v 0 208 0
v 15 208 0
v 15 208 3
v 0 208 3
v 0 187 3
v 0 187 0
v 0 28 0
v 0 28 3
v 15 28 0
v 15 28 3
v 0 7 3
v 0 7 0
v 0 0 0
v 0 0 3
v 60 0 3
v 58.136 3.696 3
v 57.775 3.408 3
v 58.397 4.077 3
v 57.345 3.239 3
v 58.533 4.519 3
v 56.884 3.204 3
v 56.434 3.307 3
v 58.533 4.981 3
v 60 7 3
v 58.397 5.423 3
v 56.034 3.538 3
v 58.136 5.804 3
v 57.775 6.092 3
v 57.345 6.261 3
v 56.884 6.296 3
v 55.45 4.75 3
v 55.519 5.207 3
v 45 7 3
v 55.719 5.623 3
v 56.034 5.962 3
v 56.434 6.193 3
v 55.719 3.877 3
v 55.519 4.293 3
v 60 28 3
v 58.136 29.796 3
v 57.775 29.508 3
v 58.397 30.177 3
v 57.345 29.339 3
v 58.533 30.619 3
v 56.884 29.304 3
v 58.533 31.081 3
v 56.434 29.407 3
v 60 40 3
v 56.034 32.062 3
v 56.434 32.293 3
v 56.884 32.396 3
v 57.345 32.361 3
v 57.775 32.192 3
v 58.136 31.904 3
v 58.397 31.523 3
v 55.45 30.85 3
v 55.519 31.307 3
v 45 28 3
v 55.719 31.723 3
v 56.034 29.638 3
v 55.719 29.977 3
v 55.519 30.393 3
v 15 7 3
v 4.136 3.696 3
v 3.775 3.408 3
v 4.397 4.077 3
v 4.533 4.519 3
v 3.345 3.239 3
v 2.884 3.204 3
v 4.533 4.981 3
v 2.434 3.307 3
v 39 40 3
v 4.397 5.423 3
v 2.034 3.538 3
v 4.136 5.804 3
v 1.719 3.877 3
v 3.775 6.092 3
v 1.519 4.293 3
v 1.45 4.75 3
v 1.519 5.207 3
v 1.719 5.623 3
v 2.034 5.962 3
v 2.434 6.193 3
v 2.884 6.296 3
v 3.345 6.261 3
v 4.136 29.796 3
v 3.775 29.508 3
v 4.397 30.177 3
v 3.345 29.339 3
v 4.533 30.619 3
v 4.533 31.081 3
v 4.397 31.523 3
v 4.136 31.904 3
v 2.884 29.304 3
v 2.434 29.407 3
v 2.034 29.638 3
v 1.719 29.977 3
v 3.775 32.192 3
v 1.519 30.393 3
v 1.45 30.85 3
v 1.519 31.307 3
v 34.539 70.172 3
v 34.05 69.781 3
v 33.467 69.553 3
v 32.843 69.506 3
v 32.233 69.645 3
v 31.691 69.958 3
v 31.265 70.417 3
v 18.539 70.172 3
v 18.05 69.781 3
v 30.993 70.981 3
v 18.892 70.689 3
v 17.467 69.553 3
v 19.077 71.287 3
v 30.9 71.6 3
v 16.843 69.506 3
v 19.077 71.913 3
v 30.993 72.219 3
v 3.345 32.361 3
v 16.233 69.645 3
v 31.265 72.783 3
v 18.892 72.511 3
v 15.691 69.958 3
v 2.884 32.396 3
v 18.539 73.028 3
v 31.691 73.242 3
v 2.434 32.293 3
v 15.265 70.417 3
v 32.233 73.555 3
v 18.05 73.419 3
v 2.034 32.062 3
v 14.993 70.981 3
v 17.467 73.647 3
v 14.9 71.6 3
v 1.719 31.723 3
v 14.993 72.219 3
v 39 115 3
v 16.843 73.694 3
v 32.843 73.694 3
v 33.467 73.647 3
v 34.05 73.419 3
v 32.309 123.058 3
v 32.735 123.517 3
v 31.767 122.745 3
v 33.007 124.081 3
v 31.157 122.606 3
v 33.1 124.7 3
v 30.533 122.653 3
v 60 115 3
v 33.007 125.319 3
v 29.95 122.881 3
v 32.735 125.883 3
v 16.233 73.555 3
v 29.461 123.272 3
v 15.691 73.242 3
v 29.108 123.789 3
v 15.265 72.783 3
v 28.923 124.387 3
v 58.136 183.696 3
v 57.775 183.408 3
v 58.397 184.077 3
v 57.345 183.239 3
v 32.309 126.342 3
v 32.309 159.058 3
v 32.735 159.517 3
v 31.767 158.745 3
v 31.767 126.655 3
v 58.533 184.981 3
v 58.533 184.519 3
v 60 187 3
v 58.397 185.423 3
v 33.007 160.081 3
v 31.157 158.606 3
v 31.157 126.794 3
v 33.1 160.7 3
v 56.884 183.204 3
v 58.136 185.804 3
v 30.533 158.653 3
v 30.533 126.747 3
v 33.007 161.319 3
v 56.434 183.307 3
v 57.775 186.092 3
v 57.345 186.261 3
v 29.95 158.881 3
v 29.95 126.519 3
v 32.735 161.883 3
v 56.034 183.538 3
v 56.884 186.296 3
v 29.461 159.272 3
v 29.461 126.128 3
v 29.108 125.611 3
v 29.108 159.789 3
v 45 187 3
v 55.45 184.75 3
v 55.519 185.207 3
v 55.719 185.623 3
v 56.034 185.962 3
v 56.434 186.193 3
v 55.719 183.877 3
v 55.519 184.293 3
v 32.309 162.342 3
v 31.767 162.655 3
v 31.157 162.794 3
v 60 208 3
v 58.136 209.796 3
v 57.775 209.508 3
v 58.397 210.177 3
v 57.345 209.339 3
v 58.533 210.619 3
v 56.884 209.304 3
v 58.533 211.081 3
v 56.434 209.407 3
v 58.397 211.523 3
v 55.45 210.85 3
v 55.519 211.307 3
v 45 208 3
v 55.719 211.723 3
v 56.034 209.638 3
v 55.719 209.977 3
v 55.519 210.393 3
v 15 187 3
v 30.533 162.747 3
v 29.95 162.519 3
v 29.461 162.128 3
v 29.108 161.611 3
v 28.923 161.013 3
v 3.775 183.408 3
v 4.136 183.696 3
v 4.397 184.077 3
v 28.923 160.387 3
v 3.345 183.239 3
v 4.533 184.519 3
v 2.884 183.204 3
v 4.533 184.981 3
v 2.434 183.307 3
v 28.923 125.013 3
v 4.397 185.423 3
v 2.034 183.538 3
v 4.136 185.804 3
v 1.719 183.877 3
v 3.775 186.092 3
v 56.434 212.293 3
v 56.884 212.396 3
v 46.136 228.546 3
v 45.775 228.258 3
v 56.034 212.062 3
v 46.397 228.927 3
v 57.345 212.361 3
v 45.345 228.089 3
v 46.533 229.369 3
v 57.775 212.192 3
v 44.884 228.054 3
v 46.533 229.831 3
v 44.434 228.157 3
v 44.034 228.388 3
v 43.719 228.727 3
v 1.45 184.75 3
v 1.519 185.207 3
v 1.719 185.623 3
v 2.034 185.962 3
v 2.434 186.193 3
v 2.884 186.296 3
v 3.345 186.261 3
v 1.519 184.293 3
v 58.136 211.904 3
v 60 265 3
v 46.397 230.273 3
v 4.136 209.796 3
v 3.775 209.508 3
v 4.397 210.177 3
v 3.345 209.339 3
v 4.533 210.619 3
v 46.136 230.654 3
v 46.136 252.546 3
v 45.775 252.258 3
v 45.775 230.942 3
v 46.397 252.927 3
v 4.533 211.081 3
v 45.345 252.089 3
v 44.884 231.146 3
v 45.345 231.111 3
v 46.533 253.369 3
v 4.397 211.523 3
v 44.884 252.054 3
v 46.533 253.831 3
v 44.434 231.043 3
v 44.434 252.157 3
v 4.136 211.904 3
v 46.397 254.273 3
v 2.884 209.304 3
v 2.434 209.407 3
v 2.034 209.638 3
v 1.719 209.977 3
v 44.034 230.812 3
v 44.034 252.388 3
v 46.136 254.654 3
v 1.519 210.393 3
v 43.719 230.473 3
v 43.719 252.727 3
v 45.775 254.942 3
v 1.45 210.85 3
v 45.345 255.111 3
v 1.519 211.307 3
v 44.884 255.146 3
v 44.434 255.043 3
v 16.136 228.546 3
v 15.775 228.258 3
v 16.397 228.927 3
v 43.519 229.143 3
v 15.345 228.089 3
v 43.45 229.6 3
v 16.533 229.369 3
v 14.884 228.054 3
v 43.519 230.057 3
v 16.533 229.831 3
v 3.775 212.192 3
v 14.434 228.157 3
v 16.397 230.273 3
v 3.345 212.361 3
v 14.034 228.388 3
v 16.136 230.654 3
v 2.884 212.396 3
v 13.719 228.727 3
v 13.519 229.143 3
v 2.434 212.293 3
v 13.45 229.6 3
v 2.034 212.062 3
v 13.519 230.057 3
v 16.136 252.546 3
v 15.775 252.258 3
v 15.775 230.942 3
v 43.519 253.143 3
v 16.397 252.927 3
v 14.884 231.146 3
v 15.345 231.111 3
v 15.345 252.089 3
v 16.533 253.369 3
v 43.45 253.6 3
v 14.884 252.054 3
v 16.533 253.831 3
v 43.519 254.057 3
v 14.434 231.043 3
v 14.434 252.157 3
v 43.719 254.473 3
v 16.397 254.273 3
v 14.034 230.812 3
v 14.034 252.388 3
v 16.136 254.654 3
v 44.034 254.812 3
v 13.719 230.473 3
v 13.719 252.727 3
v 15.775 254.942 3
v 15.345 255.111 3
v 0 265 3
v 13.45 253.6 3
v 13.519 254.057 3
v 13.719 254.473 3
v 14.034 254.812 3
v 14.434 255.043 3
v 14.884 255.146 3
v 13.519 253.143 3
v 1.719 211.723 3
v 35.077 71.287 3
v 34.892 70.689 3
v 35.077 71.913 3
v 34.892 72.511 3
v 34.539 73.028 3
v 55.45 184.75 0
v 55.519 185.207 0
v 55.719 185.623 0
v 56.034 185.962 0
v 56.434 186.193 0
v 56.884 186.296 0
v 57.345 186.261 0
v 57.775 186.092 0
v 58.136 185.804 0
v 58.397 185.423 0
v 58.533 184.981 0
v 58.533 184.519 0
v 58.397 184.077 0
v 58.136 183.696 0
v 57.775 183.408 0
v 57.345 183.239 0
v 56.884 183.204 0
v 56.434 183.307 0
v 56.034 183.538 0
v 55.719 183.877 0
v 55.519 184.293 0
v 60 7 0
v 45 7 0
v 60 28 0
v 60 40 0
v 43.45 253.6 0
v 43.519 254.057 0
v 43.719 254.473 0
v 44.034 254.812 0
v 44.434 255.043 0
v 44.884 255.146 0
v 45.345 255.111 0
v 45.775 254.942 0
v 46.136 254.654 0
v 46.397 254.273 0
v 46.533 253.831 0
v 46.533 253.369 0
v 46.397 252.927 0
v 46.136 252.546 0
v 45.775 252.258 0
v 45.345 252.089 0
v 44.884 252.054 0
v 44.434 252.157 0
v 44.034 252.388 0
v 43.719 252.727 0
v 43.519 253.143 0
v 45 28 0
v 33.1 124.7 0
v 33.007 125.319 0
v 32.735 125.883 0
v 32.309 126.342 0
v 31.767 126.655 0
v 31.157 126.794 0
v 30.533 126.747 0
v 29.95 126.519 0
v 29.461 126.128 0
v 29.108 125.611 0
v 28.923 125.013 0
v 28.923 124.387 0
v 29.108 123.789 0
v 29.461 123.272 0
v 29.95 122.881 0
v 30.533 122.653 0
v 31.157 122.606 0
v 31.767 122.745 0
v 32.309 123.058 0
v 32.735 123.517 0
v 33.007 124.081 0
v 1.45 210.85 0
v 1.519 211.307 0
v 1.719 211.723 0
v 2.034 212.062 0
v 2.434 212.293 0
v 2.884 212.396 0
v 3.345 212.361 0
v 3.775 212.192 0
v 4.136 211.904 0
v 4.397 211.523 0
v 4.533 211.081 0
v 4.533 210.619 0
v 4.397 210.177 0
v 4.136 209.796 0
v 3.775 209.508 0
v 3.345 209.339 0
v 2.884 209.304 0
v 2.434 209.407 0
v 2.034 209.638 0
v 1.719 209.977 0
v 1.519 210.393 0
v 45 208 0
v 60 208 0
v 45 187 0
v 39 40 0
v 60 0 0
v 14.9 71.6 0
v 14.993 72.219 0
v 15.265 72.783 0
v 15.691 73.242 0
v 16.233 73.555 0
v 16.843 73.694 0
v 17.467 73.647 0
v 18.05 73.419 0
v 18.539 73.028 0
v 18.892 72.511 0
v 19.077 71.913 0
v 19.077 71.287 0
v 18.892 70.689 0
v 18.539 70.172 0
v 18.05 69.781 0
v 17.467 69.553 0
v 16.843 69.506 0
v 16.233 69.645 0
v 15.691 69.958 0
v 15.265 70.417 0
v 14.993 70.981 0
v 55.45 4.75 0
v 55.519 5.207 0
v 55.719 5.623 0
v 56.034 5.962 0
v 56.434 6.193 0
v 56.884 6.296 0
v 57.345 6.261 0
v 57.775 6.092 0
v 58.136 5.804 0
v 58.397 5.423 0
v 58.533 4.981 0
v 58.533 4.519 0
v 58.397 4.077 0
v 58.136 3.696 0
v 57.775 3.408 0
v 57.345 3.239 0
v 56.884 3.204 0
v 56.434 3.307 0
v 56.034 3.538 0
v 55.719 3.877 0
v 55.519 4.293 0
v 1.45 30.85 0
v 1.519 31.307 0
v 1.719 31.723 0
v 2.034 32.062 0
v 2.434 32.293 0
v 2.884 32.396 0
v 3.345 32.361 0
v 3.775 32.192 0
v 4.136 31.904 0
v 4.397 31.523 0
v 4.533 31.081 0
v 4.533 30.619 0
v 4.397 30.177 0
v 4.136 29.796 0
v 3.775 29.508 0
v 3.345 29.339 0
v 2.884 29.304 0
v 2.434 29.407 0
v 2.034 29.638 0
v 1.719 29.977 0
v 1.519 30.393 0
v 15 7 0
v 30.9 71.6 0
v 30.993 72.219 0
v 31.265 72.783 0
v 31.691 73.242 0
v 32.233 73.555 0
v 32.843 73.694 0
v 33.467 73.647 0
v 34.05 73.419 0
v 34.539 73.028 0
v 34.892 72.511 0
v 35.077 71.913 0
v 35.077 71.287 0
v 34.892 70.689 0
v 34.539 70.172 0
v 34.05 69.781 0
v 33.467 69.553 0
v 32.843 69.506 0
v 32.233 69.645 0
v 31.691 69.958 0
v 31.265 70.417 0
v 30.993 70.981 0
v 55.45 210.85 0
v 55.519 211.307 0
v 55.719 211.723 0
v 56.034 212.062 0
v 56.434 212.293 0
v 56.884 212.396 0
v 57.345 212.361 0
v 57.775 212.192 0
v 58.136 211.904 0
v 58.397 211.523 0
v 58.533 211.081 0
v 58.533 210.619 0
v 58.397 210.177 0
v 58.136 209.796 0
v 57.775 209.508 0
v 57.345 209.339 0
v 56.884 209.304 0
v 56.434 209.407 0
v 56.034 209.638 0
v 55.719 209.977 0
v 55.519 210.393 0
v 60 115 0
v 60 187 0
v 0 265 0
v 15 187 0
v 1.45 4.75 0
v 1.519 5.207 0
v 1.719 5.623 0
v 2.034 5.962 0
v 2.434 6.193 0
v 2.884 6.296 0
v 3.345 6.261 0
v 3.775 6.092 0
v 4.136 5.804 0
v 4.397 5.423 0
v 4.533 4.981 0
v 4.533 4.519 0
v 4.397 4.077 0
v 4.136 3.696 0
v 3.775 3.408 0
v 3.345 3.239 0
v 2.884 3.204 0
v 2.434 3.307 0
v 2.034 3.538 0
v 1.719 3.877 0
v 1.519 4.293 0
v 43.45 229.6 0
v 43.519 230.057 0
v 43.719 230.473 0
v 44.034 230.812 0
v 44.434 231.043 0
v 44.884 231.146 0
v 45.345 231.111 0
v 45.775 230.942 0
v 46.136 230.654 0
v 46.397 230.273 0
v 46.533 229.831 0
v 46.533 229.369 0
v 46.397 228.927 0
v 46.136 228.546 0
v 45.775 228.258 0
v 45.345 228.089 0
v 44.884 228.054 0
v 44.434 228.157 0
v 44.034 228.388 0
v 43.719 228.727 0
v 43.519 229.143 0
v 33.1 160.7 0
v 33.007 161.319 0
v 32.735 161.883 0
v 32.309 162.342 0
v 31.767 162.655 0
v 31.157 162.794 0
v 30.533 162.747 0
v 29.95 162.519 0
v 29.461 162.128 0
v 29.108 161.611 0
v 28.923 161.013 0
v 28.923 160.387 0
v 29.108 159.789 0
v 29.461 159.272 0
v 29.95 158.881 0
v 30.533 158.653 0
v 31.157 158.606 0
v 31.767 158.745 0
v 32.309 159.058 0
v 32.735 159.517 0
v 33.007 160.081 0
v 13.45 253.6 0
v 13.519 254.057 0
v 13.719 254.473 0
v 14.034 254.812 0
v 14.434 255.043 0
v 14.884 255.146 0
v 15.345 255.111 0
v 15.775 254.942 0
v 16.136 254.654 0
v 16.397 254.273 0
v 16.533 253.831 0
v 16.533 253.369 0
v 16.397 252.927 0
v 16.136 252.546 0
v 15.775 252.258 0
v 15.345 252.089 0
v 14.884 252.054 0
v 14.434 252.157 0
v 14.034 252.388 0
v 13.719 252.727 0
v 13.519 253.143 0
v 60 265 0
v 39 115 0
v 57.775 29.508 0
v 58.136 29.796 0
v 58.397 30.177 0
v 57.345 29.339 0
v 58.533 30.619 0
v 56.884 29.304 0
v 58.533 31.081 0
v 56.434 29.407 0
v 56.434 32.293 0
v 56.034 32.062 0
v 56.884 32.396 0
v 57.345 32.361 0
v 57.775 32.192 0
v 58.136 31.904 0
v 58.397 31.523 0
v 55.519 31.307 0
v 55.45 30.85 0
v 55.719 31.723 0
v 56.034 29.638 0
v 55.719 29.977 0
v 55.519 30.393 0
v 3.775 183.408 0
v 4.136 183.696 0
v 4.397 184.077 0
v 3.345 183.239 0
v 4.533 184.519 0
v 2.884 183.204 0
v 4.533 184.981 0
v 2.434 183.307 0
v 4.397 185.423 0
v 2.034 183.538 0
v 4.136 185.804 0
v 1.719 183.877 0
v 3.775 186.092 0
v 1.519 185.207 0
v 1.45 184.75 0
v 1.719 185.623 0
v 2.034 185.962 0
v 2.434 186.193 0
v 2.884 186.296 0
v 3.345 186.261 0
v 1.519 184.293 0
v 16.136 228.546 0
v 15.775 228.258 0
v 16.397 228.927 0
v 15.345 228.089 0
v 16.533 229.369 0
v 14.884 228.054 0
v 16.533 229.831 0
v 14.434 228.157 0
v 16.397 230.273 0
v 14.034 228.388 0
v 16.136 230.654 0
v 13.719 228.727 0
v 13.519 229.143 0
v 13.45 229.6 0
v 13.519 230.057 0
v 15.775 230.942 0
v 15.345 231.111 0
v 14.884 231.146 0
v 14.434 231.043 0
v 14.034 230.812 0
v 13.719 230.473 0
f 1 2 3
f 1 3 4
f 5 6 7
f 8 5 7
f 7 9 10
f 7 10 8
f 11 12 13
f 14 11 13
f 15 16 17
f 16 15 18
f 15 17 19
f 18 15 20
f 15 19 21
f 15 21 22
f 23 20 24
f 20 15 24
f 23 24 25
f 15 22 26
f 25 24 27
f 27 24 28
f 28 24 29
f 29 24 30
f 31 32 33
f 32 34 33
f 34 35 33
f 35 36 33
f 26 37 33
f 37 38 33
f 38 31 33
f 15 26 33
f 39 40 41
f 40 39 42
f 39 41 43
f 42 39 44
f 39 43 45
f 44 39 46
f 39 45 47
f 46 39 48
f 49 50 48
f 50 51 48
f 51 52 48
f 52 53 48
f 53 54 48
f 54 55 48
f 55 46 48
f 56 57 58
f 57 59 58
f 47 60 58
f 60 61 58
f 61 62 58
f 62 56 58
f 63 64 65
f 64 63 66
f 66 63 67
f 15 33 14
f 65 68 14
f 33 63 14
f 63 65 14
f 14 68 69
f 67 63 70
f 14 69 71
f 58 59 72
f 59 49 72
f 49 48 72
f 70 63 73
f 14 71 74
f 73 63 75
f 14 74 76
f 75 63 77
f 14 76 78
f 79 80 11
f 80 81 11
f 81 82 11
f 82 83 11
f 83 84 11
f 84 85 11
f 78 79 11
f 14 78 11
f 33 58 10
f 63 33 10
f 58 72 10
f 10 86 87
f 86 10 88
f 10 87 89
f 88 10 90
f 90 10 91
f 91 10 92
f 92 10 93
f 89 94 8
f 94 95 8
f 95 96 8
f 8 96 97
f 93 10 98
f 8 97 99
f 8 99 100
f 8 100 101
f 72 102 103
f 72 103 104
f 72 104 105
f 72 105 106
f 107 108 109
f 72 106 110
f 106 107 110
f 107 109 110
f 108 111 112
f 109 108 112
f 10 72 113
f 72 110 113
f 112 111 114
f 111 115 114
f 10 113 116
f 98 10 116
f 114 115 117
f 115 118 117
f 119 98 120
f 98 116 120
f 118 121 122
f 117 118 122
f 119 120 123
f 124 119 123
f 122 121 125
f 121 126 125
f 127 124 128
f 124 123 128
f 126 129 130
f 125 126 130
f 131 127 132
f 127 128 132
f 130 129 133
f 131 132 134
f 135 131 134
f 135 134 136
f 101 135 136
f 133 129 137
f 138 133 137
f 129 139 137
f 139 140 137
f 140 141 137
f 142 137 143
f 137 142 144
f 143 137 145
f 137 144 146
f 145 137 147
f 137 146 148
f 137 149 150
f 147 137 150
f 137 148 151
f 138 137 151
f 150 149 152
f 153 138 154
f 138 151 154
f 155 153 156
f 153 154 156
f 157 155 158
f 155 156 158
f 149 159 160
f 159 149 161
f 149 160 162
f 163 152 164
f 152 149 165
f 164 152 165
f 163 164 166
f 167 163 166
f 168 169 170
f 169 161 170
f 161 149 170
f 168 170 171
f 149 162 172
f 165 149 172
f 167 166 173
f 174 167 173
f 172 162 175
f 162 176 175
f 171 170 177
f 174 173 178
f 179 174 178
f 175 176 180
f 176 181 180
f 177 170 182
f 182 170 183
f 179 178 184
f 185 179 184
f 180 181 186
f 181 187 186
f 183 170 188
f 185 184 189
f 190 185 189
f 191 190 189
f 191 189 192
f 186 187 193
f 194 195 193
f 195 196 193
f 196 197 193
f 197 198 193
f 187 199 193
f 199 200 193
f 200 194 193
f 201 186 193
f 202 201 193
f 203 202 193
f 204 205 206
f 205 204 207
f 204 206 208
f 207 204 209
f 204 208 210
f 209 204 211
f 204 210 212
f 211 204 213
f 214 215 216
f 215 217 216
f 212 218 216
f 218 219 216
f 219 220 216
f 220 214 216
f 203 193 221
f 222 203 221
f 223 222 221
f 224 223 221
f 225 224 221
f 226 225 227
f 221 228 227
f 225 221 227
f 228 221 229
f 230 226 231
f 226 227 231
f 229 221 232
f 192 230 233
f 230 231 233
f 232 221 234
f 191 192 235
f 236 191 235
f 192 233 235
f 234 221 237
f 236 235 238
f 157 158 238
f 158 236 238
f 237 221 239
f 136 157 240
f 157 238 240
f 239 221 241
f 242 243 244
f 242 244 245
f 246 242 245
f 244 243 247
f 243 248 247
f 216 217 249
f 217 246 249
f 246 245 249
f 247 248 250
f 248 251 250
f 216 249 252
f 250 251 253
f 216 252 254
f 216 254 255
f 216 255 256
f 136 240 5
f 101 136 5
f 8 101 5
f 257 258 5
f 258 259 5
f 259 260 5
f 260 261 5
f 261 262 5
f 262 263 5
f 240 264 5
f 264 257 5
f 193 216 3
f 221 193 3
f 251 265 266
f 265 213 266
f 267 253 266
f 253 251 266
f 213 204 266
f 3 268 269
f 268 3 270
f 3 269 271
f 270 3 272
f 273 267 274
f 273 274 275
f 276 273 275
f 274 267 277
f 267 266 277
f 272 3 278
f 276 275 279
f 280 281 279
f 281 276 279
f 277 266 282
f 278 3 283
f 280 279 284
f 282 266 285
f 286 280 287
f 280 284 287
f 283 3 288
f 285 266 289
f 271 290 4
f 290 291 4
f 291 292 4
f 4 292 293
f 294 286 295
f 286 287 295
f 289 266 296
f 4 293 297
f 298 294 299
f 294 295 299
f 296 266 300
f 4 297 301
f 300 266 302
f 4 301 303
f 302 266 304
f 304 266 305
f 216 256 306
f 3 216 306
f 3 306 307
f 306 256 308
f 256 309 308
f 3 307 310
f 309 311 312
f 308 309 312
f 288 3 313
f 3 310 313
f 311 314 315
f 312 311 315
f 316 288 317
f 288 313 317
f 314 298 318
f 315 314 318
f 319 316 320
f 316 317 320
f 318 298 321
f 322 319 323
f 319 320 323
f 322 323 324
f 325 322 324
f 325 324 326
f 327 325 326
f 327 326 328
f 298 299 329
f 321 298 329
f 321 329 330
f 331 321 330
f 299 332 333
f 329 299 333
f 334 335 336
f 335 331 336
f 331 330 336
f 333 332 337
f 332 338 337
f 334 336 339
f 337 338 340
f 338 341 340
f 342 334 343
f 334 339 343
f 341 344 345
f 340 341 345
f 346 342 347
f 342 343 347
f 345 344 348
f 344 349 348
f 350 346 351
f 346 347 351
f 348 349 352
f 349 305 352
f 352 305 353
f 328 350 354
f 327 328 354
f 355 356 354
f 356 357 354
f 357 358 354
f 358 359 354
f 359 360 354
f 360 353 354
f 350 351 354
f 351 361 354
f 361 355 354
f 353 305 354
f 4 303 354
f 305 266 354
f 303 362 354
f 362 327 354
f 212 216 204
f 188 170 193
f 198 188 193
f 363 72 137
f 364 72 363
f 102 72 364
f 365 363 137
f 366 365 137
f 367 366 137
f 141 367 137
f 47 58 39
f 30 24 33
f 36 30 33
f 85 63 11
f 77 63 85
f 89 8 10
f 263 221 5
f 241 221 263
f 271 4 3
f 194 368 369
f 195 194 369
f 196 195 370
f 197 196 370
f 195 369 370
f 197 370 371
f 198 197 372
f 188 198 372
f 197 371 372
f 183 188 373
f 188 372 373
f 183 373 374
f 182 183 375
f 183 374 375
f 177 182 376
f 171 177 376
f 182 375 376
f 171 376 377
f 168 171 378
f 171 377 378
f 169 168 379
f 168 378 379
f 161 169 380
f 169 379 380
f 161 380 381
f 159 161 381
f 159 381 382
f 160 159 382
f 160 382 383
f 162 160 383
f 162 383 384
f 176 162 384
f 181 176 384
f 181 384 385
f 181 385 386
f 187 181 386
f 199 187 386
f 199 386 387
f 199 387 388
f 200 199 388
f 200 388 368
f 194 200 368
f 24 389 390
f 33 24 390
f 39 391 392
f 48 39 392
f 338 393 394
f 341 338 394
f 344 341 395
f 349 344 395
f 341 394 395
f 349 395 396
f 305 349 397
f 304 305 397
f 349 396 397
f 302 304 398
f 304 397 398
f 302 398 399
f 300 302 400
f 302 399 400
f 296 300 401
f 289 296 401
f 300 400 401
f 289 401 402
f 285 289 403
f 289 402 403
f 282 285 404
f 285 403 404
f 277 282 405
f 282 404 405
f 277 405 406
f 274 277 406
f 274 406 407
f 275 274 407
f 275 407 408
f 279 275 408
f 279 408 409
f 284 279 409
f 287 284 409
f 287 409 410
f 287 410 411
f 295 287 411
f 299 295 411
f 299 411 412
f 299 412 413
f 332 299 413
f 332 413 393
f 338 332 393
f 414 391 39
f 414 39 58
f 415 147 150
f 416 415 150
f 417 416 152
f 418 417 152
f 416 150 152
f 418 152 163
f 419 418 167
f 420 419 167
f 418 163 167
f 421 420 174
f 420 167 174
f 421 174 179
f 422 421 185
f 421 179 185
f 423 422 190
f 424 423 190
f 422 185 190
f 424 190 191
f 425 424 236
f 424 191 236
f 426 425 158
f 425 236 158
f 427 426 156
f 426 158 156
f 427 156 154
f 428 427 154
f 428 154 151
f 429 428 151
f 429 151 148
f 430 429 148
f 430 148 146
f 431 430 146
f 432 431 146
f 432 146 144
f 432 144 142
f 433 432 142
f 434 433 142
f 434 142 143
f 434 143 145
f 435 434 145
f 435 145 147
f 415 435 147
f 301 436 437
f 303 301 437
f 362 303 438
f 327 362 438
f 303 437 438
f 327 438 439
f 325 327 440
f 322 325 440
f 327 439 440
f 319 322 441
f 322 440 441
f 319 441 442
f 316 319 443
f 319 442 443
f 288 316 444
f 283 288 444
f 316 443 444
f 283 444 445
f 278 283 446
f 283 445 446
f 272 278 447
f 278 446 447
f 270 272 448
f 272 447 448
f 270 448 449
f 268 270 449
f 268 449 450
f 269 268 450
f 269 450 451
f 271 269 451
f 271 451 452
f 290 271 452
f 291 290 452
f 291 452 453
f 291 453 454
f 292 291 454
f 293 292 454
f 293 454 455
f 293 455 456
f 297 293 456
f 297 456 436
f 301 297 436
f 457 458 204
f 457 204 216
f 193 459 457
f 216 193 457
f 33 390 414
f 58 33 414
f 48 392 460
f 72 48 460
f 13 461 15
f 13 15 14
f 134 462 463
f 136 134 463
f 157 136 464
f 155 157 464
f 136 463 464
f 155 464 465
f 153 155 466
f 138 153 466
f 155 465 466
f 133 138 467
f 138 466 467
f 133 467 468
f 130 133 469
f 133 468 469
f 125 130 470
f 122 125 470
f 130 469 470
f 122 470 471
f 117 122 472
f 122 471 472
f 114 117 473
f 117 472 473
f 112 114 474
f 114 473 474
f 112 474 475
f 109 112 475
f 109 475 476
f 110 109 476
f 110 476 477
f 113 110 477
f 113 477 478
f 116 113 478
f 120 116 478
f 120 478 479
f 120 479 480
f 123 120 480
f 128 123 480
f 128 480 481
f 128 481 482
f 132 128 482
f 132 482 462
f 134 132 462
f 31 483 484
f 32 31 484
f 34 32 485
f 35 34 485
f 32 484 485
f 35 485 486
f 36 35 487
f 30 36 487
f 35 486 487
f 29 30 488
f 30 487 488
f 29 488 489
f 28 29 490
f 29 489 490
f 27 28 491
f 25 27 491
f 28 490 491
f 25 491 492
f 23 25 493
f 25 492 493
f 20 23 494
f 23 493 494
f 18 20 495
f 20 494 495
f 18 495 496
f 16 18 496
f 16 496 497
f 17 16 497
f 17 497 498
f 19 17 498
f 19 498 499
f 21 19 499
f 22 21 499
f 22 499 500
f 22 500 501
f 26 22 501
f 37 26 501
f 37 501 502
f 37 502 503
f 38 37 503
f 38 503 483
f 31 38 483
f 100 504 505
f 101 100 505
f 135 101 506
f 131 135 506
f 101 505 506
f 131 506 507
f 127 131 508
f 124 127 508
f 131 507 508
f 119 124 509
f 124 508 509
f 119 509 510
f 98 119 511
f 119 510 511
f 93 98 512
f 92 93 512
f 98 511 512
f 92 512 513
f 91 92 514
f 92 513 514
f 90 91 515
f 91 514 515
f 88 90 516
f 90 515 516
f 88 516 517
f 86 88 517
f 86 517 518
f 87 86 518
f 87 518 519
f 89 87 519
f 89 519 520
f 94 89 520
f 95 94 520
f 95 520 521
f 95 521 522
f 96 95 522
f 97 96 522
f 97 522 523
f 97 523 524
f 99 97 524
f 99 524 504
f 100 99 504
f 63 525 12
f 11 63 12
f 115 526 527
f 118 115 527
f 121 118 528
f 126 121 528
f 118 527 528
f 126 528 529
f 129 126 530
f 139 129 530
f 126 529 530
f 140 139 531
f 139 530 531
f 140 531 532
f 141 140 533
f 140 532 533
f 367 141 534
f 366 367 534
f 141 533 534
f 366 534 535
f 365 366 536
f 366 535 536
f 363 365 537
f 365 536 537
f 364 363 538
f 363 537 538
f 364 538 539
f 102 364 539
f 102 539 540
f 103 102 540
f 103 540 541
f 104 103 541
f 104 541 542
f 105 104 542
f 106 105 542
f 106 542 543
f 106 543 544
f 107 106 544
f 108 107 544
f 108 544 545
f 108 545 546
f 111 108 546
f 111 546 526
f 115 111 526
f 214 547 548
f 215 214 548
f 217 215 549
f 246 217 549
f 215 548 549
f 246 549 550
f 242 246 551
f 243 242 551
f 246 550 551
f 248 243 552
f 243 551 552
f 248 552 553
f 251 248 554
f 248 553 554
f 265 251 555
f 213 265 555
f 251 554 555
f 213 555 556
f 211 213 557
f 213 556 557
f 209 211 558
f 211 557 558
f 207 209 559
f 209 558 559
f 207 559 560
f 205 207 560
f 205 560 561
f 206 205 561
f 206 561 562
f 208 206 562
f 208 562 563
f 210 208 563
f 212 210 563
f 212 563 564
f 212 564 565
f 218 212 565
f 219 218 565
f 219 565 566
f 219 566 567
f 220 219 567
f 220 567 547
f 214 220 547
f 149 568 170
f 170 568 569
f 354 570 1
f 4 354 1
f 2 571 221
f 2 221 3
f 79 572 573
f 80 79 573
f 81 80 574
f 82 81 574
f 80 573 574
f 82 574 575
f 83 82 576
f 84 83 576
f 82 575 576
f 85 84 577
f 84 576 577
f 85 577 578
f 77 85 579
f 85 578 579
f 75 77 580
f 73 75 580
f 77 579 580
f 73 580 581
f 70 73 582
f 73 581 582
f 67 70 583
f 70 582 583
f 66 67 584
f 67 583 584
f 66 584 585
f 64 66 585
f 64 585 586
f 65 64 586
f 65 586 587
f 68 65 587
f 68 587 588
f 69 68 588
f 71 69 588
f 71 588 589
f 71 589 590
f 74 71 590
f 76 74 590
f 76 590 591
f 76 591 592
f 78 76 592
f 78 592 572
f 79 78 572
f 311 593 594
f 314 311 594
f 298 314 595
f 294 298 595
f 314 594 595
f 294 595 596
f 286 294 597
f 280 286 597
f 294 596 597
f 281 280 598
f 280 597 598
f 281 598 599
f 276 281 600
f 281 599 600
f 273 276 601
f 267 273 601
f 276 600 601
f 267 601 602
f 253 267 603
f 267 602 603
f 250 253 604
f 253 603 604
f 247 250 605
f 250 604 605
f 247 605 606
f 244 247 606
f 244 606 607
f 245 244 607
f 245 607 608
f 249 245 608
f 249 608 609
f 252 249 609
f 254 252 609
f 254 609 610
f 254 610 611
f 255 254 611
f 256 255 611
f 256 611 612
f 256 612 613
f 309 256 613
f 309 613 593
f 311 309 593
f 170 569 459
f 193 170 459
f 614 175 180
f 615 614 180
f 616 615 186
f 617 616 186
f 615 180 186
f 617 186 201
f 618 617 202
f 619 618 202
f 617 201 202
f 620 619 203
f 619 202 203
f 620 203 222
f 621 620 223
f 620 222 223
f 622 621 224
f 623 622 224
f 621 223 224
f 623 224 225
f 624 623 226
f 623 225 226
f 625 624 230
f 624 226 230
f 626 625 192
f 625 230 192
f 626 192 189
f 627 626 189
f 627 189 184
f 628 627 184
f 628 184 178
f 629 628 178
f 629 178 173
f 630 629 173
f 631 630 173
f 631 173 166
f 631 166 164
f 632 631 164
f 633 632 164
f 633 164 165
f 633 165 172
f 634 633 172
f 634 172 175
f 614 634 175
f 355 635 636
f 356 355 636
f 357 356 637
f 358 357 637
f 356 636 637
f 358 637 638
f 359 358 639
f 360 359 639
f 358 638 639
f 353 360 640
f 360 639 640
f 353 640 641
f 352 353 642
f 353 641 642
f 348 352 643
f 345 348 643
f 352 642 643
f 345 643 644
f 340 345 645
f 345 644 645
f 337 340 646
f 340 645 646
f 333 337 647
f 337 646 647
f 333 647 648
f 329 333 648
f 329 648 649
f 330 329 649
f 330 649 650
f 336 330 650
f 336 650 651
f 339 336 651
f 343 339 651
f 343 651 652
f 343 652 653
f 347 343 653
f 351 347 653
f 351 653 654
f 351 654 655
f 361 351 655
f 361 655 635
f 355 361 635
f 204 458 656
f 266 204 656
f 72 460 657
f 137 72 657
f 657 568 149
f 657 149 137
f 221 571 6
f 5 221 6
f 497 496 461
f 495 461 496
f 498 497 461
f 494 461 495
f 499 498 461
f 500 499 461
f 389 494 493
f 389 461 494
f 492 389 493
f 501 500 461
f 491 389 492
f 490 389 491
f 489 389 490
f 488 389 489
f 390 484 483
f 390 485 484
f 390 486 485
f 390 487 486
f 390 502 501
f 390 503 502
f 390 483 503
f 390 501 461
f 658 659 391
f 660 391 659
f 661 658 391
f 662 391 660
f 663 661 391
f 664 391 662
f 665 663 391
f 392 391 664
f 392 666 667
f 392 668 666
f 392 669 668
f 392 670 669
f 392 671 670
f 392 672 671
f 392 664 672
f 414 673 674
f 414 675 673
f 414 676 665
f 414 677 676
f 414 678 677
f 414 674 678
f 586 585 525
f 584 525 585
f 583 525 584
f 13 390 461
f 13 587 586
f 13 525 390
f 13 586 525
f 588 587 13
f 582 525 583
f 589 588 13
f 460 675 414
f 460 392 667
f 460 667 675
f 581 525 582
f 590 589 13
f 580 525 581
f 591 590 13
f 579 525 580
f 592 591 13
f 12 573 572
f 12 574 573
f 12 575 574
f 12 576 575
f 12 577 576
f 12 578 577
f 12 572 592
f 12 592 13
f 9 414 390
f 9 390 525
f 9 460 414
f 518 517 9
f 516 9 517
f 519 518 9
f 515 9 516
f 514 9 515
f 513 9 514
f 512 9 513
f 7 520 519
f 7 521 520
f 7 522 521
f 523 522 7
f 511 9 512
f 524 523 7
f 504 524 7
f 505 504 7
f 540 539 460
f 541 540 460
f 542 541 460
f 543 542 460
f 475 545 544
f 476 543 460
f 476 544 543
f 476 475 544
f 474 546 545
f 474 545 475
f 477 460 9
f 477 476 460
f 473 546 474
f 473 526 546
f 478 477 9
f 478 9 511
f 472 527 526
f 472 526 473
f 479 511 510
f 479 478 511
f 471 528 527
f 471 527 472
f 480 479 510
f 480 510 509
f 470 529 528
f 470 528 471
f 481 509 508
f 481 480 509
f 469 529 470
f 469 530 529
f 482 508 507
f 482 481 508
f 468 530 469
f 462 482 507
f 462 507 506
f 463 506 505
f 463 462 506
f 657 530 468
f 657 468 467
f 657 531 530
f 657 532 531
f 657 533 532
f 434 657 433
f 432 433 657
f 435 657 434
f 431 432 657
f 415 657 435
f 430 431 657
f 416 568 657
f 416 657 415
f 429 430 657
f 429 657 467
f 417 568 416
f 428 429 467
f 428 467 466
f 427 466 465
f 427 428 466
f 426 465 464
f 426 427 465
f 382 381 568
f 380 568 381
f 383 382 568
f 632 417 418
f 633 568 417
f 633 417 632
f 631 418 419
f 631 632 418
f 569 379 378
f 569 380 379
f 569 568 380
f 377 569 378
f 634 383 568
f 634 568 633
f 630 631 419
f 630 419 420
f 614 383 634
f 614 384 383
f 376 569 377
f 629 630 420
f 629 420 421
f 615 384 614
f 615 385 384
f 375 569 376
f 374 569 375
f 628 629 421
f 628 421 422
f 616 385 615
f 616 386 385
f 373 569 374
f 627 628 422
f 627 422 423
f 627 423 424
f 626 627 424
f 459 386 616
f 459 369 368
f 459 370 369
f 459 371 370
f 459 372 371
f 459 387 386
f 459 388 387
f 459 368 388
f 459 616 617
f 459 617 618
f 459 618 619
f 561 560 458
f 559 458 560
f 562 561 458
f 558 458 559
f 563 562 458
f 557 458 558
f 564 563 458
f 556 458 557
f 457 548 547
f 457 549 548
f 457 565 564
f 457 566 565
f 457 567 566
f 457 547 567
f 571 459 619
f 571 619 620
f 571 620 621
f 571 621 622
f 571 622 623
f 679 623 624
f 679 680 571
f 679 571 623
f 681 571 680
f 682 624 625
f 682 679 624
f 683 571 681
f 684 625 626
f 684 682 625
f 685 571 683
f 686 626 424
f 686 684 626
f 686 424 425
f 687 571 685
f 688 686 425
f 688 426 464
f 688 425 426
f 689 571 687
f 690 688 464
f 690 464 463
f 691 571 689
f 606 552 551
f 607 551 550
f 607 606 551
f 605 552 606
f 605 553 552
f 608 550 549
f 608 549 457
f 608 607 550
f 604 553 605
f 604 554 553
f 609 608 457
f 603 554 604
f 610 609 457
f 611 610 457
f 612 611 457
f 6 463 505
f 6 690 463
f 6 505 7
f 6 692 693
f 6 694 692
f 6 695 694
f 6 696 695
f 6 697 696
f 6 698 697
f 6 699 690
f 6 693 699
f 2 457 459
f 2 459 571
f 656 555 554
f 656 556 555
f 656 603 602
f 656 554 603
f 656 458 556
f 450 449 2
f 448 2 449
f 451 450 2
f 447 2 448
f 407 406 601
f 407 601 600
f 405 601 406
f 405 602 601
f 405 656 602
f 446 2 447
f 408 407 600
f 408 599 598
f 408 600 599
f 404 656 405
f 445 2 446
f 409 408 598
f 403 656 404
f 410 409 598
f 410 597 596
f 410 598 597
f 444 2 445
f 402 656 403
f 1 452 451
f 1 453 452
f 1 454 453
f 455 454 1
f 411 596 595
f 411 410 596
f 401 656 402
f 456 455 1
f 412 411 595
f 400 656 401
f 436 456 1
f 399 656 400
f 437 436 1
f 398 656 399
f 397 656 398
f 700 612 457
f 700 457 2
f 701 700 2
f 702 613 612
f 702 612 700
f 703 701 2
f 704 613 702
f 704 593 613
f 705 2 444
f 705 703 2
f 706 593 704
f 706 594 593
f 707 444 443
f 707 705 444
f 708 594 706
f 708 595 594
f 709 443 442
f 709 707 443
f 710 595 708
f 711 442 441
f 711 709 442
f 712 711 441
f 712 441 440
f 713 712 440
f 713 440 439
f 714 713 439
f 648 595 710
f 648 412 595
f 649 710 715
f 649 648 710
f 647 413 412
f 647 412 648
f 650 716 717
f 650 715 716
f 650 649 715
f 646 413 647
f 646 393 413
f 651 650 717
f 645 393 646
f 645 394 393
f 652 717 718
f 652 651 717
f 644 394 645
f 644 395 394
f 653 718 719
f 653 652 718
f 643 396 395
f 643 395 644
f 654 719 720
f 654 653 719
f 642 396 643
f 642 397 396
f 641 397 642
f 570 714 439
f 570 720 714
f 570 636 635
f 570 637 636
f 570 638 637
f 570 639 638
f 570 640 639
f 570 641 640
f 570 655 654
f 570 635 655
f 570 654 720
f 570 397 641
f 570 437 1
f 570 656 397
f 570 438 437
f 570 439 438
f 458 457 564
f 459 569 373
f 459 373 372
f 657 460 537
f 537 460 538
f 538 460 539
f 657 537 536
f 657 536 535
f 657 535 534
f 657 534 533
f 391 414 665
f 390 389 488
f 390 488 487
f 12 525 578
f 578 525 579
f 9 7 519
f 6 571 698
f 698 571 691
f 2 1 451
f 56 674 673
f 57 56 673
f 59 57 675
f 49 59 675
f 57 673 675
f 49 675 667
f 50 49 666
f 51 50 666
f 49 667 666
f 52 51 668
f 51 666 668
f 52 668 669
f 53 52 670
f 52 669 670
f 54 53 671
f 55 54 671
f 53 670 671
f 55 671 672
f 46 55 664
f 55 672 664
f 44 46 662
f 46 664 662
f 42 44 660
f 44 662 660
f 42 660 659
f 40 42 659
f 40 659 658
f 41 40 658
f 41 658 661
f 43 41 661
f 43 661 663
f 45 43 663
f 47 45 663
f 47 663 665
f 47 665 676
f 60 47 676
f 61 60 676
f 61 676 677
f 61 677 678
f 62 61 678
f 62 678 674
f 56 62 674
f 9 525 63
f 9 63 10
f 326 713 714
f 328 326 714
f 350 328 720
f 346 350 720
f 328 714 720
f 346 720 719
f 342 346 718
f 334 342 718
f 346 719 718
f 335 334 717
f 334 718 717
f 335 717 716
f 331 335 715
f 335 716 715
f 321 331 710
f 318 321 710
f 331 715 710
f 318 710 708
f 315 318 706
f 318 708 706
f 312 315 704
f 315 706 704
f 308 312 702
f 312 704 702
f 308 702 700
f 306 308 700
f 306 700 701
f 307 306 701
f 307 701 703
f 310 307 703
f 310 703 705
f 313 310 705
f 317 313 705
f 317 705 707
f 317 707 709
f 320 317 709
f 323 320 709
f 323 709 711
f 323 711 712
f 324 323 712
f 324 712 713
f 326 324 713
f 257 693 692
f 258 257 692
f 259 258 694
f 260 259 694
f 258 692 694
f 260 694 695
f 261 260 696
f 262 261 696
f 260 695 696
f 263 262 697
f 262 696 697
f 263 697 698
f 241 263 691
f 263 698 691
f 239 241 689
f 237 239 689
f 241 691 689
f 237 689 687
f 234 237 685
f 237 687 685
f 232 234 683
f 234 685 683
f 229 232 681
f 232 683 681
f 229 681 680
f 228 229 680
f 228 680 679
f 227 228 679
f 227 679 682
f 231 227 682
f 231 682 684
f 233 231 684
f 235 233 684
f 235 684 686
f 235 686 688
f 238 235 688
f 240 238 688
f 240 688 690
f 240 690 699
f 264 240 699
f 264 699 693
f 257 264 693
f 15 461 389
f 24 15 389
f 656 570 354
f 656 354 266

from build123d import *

# Parameters (mm, degrees)
EXTRUDE_1_DEPTH     = 3
SKETCH_4_W          = 15
SKETCH_4_H          = 21
CUT_EXTRUDE_1_DEPTH = 3
SKETCH_5_R          = 1.55
CUT_EXTRUDE_2_DEPTH = 272.724124803
SKETCH_7_W          = 21
SKETCH_7_H          = 75
CUT_EXTRUDE_3_DEPTH = 272.724124803
SKETCH_8_R          = 2.1
CUT_EXTRUDE_4_DEPTH = 272.724124803
SKETCH_9_R          = 2.1
CUT_EXTRUDE_5_DEPTH = 272.724124803


with BuildPart() as part:
    # 草图1 → 凸台-拉伸1 (new body)
    with BuildSketch(Plane.XY):
        Polygon((0, 240), (0, 265), (60, 265), (60, 240), (60, 0), (0, 0), align=None)
    extrude(amount=EXTRUDE_1_DEPTH)

    # 草图4 → 切除-拉伸1 (cut)
    with BuildSketch(Plane(origin=(0, 0, 0), x_dir=(-1, 0, 0), z_dir=(0, 0, -1))):
        with Locations((-52.5, 17.5)):
            Rectangle(SKETCH_4_W, SKETCH_4_H)
        with Locations((-7.5, 17.5)):
            Rectangle(SKETCH_4_W, SKETCH_4_H)
        with Locations((-7.5, 197.5)):
            Rectangle(SKETCH_4_W, SKETCH_4_H)
        with Locations((-52.5, 197.5)):
            Rectangle(SKETCH_4_W, SKETCH_4_H)
    extrude(amount=-CUT_EXTRUDE_1_DEPTH, mode=Mode.SUBTRACT)

    # 草图5 → 切除-拉伸2 (cut, through all)
    with BuildSketch(Plane(origin=(0, 0, 0), x_dir=(-1, 0, 0), z_dir=(0, 0, -1))):
        with Locations((-45, 229.6)):
            Circle(SKETCH_5_R)
        with Locations((-45, 253.6)):
            Circle(SKETCH_5_R)
        with Locations((-15, 253.6)):
            Circle(SKETCH_5_R)
        with Locations((-15, 229.6)):
            Circle(SKETCH_5_R)
        with Locations((-57, 184.75)):
            Circle(SKETCH_5_R)
        with Locations((-3, 184.75)):
            Circle(SKETCH_5_R)
        with Locations((-3, 210.85)):
            Circle(SKETCH_5_R)
        with Locations((-57, 210.85)):
            Circle(SKETCH_5_R)
        with Locations((-57, 4.75)):
            Circle(SKETCH_5_R)
        with Locations((-3, 4.75)):
            Circle(SKETCH_5_R)
        with Locations((-3, 30.85)):
            Circle(SKETCH_5_R)
        with Locations((-57, 30.85)):
            Circle(SKETCH_5_R)
    extrude(amount=-CUT_EXTRUDE_2_DEPTH, mode=Mode.SUBTRACT)

    # 草图7 → 切除-拉伸3 (cut, through all)
    with BuildSketch(Plane(origin=(0, 0, 0), x_dir=(-1, 0, 0), z_dir=(0, 0, -1))):
        with Locations((-49.5, 77.5)):
            Rectangle(SKETCH_7_W, SKETCH_7_H)
    extrude(amount=-CUT_EXTRUDE_3_DEPTH, mode=Mode.SUBTRACT)

    # 草图8 → 切除-拉伸4 (cut, through all)
    with BuildSketch(Plane.XY.offset(3)):
        with Locations((31, 160.7)):
            Circle(SKETCH_8_R)
        with Locations((31, 124.7)):
            Circle(SKETCH_8_R)
    extrude(amount=-CUT_EXTRUDE_4_DEPTH, mode=Mode.SUBTRACT)

    # 草图9 → 切除-拉伸5 (cut, through all)
    with BuildSketch(Plane(origin=(0, 0, 0), x_dir=(-1, 0, 0), z_dir=(0, 0, -1))):
        with Locations((-17, 71.6)):
            Circle(SKETCH_9_R)
        with Locations((-33, 71.6)):
            Circle(SKETCH_9_R)
    extrude(amount=-CUT_EXTRUDE_5_DEPTH, mode=Mode.SUBTRACT)


solid = part.part
